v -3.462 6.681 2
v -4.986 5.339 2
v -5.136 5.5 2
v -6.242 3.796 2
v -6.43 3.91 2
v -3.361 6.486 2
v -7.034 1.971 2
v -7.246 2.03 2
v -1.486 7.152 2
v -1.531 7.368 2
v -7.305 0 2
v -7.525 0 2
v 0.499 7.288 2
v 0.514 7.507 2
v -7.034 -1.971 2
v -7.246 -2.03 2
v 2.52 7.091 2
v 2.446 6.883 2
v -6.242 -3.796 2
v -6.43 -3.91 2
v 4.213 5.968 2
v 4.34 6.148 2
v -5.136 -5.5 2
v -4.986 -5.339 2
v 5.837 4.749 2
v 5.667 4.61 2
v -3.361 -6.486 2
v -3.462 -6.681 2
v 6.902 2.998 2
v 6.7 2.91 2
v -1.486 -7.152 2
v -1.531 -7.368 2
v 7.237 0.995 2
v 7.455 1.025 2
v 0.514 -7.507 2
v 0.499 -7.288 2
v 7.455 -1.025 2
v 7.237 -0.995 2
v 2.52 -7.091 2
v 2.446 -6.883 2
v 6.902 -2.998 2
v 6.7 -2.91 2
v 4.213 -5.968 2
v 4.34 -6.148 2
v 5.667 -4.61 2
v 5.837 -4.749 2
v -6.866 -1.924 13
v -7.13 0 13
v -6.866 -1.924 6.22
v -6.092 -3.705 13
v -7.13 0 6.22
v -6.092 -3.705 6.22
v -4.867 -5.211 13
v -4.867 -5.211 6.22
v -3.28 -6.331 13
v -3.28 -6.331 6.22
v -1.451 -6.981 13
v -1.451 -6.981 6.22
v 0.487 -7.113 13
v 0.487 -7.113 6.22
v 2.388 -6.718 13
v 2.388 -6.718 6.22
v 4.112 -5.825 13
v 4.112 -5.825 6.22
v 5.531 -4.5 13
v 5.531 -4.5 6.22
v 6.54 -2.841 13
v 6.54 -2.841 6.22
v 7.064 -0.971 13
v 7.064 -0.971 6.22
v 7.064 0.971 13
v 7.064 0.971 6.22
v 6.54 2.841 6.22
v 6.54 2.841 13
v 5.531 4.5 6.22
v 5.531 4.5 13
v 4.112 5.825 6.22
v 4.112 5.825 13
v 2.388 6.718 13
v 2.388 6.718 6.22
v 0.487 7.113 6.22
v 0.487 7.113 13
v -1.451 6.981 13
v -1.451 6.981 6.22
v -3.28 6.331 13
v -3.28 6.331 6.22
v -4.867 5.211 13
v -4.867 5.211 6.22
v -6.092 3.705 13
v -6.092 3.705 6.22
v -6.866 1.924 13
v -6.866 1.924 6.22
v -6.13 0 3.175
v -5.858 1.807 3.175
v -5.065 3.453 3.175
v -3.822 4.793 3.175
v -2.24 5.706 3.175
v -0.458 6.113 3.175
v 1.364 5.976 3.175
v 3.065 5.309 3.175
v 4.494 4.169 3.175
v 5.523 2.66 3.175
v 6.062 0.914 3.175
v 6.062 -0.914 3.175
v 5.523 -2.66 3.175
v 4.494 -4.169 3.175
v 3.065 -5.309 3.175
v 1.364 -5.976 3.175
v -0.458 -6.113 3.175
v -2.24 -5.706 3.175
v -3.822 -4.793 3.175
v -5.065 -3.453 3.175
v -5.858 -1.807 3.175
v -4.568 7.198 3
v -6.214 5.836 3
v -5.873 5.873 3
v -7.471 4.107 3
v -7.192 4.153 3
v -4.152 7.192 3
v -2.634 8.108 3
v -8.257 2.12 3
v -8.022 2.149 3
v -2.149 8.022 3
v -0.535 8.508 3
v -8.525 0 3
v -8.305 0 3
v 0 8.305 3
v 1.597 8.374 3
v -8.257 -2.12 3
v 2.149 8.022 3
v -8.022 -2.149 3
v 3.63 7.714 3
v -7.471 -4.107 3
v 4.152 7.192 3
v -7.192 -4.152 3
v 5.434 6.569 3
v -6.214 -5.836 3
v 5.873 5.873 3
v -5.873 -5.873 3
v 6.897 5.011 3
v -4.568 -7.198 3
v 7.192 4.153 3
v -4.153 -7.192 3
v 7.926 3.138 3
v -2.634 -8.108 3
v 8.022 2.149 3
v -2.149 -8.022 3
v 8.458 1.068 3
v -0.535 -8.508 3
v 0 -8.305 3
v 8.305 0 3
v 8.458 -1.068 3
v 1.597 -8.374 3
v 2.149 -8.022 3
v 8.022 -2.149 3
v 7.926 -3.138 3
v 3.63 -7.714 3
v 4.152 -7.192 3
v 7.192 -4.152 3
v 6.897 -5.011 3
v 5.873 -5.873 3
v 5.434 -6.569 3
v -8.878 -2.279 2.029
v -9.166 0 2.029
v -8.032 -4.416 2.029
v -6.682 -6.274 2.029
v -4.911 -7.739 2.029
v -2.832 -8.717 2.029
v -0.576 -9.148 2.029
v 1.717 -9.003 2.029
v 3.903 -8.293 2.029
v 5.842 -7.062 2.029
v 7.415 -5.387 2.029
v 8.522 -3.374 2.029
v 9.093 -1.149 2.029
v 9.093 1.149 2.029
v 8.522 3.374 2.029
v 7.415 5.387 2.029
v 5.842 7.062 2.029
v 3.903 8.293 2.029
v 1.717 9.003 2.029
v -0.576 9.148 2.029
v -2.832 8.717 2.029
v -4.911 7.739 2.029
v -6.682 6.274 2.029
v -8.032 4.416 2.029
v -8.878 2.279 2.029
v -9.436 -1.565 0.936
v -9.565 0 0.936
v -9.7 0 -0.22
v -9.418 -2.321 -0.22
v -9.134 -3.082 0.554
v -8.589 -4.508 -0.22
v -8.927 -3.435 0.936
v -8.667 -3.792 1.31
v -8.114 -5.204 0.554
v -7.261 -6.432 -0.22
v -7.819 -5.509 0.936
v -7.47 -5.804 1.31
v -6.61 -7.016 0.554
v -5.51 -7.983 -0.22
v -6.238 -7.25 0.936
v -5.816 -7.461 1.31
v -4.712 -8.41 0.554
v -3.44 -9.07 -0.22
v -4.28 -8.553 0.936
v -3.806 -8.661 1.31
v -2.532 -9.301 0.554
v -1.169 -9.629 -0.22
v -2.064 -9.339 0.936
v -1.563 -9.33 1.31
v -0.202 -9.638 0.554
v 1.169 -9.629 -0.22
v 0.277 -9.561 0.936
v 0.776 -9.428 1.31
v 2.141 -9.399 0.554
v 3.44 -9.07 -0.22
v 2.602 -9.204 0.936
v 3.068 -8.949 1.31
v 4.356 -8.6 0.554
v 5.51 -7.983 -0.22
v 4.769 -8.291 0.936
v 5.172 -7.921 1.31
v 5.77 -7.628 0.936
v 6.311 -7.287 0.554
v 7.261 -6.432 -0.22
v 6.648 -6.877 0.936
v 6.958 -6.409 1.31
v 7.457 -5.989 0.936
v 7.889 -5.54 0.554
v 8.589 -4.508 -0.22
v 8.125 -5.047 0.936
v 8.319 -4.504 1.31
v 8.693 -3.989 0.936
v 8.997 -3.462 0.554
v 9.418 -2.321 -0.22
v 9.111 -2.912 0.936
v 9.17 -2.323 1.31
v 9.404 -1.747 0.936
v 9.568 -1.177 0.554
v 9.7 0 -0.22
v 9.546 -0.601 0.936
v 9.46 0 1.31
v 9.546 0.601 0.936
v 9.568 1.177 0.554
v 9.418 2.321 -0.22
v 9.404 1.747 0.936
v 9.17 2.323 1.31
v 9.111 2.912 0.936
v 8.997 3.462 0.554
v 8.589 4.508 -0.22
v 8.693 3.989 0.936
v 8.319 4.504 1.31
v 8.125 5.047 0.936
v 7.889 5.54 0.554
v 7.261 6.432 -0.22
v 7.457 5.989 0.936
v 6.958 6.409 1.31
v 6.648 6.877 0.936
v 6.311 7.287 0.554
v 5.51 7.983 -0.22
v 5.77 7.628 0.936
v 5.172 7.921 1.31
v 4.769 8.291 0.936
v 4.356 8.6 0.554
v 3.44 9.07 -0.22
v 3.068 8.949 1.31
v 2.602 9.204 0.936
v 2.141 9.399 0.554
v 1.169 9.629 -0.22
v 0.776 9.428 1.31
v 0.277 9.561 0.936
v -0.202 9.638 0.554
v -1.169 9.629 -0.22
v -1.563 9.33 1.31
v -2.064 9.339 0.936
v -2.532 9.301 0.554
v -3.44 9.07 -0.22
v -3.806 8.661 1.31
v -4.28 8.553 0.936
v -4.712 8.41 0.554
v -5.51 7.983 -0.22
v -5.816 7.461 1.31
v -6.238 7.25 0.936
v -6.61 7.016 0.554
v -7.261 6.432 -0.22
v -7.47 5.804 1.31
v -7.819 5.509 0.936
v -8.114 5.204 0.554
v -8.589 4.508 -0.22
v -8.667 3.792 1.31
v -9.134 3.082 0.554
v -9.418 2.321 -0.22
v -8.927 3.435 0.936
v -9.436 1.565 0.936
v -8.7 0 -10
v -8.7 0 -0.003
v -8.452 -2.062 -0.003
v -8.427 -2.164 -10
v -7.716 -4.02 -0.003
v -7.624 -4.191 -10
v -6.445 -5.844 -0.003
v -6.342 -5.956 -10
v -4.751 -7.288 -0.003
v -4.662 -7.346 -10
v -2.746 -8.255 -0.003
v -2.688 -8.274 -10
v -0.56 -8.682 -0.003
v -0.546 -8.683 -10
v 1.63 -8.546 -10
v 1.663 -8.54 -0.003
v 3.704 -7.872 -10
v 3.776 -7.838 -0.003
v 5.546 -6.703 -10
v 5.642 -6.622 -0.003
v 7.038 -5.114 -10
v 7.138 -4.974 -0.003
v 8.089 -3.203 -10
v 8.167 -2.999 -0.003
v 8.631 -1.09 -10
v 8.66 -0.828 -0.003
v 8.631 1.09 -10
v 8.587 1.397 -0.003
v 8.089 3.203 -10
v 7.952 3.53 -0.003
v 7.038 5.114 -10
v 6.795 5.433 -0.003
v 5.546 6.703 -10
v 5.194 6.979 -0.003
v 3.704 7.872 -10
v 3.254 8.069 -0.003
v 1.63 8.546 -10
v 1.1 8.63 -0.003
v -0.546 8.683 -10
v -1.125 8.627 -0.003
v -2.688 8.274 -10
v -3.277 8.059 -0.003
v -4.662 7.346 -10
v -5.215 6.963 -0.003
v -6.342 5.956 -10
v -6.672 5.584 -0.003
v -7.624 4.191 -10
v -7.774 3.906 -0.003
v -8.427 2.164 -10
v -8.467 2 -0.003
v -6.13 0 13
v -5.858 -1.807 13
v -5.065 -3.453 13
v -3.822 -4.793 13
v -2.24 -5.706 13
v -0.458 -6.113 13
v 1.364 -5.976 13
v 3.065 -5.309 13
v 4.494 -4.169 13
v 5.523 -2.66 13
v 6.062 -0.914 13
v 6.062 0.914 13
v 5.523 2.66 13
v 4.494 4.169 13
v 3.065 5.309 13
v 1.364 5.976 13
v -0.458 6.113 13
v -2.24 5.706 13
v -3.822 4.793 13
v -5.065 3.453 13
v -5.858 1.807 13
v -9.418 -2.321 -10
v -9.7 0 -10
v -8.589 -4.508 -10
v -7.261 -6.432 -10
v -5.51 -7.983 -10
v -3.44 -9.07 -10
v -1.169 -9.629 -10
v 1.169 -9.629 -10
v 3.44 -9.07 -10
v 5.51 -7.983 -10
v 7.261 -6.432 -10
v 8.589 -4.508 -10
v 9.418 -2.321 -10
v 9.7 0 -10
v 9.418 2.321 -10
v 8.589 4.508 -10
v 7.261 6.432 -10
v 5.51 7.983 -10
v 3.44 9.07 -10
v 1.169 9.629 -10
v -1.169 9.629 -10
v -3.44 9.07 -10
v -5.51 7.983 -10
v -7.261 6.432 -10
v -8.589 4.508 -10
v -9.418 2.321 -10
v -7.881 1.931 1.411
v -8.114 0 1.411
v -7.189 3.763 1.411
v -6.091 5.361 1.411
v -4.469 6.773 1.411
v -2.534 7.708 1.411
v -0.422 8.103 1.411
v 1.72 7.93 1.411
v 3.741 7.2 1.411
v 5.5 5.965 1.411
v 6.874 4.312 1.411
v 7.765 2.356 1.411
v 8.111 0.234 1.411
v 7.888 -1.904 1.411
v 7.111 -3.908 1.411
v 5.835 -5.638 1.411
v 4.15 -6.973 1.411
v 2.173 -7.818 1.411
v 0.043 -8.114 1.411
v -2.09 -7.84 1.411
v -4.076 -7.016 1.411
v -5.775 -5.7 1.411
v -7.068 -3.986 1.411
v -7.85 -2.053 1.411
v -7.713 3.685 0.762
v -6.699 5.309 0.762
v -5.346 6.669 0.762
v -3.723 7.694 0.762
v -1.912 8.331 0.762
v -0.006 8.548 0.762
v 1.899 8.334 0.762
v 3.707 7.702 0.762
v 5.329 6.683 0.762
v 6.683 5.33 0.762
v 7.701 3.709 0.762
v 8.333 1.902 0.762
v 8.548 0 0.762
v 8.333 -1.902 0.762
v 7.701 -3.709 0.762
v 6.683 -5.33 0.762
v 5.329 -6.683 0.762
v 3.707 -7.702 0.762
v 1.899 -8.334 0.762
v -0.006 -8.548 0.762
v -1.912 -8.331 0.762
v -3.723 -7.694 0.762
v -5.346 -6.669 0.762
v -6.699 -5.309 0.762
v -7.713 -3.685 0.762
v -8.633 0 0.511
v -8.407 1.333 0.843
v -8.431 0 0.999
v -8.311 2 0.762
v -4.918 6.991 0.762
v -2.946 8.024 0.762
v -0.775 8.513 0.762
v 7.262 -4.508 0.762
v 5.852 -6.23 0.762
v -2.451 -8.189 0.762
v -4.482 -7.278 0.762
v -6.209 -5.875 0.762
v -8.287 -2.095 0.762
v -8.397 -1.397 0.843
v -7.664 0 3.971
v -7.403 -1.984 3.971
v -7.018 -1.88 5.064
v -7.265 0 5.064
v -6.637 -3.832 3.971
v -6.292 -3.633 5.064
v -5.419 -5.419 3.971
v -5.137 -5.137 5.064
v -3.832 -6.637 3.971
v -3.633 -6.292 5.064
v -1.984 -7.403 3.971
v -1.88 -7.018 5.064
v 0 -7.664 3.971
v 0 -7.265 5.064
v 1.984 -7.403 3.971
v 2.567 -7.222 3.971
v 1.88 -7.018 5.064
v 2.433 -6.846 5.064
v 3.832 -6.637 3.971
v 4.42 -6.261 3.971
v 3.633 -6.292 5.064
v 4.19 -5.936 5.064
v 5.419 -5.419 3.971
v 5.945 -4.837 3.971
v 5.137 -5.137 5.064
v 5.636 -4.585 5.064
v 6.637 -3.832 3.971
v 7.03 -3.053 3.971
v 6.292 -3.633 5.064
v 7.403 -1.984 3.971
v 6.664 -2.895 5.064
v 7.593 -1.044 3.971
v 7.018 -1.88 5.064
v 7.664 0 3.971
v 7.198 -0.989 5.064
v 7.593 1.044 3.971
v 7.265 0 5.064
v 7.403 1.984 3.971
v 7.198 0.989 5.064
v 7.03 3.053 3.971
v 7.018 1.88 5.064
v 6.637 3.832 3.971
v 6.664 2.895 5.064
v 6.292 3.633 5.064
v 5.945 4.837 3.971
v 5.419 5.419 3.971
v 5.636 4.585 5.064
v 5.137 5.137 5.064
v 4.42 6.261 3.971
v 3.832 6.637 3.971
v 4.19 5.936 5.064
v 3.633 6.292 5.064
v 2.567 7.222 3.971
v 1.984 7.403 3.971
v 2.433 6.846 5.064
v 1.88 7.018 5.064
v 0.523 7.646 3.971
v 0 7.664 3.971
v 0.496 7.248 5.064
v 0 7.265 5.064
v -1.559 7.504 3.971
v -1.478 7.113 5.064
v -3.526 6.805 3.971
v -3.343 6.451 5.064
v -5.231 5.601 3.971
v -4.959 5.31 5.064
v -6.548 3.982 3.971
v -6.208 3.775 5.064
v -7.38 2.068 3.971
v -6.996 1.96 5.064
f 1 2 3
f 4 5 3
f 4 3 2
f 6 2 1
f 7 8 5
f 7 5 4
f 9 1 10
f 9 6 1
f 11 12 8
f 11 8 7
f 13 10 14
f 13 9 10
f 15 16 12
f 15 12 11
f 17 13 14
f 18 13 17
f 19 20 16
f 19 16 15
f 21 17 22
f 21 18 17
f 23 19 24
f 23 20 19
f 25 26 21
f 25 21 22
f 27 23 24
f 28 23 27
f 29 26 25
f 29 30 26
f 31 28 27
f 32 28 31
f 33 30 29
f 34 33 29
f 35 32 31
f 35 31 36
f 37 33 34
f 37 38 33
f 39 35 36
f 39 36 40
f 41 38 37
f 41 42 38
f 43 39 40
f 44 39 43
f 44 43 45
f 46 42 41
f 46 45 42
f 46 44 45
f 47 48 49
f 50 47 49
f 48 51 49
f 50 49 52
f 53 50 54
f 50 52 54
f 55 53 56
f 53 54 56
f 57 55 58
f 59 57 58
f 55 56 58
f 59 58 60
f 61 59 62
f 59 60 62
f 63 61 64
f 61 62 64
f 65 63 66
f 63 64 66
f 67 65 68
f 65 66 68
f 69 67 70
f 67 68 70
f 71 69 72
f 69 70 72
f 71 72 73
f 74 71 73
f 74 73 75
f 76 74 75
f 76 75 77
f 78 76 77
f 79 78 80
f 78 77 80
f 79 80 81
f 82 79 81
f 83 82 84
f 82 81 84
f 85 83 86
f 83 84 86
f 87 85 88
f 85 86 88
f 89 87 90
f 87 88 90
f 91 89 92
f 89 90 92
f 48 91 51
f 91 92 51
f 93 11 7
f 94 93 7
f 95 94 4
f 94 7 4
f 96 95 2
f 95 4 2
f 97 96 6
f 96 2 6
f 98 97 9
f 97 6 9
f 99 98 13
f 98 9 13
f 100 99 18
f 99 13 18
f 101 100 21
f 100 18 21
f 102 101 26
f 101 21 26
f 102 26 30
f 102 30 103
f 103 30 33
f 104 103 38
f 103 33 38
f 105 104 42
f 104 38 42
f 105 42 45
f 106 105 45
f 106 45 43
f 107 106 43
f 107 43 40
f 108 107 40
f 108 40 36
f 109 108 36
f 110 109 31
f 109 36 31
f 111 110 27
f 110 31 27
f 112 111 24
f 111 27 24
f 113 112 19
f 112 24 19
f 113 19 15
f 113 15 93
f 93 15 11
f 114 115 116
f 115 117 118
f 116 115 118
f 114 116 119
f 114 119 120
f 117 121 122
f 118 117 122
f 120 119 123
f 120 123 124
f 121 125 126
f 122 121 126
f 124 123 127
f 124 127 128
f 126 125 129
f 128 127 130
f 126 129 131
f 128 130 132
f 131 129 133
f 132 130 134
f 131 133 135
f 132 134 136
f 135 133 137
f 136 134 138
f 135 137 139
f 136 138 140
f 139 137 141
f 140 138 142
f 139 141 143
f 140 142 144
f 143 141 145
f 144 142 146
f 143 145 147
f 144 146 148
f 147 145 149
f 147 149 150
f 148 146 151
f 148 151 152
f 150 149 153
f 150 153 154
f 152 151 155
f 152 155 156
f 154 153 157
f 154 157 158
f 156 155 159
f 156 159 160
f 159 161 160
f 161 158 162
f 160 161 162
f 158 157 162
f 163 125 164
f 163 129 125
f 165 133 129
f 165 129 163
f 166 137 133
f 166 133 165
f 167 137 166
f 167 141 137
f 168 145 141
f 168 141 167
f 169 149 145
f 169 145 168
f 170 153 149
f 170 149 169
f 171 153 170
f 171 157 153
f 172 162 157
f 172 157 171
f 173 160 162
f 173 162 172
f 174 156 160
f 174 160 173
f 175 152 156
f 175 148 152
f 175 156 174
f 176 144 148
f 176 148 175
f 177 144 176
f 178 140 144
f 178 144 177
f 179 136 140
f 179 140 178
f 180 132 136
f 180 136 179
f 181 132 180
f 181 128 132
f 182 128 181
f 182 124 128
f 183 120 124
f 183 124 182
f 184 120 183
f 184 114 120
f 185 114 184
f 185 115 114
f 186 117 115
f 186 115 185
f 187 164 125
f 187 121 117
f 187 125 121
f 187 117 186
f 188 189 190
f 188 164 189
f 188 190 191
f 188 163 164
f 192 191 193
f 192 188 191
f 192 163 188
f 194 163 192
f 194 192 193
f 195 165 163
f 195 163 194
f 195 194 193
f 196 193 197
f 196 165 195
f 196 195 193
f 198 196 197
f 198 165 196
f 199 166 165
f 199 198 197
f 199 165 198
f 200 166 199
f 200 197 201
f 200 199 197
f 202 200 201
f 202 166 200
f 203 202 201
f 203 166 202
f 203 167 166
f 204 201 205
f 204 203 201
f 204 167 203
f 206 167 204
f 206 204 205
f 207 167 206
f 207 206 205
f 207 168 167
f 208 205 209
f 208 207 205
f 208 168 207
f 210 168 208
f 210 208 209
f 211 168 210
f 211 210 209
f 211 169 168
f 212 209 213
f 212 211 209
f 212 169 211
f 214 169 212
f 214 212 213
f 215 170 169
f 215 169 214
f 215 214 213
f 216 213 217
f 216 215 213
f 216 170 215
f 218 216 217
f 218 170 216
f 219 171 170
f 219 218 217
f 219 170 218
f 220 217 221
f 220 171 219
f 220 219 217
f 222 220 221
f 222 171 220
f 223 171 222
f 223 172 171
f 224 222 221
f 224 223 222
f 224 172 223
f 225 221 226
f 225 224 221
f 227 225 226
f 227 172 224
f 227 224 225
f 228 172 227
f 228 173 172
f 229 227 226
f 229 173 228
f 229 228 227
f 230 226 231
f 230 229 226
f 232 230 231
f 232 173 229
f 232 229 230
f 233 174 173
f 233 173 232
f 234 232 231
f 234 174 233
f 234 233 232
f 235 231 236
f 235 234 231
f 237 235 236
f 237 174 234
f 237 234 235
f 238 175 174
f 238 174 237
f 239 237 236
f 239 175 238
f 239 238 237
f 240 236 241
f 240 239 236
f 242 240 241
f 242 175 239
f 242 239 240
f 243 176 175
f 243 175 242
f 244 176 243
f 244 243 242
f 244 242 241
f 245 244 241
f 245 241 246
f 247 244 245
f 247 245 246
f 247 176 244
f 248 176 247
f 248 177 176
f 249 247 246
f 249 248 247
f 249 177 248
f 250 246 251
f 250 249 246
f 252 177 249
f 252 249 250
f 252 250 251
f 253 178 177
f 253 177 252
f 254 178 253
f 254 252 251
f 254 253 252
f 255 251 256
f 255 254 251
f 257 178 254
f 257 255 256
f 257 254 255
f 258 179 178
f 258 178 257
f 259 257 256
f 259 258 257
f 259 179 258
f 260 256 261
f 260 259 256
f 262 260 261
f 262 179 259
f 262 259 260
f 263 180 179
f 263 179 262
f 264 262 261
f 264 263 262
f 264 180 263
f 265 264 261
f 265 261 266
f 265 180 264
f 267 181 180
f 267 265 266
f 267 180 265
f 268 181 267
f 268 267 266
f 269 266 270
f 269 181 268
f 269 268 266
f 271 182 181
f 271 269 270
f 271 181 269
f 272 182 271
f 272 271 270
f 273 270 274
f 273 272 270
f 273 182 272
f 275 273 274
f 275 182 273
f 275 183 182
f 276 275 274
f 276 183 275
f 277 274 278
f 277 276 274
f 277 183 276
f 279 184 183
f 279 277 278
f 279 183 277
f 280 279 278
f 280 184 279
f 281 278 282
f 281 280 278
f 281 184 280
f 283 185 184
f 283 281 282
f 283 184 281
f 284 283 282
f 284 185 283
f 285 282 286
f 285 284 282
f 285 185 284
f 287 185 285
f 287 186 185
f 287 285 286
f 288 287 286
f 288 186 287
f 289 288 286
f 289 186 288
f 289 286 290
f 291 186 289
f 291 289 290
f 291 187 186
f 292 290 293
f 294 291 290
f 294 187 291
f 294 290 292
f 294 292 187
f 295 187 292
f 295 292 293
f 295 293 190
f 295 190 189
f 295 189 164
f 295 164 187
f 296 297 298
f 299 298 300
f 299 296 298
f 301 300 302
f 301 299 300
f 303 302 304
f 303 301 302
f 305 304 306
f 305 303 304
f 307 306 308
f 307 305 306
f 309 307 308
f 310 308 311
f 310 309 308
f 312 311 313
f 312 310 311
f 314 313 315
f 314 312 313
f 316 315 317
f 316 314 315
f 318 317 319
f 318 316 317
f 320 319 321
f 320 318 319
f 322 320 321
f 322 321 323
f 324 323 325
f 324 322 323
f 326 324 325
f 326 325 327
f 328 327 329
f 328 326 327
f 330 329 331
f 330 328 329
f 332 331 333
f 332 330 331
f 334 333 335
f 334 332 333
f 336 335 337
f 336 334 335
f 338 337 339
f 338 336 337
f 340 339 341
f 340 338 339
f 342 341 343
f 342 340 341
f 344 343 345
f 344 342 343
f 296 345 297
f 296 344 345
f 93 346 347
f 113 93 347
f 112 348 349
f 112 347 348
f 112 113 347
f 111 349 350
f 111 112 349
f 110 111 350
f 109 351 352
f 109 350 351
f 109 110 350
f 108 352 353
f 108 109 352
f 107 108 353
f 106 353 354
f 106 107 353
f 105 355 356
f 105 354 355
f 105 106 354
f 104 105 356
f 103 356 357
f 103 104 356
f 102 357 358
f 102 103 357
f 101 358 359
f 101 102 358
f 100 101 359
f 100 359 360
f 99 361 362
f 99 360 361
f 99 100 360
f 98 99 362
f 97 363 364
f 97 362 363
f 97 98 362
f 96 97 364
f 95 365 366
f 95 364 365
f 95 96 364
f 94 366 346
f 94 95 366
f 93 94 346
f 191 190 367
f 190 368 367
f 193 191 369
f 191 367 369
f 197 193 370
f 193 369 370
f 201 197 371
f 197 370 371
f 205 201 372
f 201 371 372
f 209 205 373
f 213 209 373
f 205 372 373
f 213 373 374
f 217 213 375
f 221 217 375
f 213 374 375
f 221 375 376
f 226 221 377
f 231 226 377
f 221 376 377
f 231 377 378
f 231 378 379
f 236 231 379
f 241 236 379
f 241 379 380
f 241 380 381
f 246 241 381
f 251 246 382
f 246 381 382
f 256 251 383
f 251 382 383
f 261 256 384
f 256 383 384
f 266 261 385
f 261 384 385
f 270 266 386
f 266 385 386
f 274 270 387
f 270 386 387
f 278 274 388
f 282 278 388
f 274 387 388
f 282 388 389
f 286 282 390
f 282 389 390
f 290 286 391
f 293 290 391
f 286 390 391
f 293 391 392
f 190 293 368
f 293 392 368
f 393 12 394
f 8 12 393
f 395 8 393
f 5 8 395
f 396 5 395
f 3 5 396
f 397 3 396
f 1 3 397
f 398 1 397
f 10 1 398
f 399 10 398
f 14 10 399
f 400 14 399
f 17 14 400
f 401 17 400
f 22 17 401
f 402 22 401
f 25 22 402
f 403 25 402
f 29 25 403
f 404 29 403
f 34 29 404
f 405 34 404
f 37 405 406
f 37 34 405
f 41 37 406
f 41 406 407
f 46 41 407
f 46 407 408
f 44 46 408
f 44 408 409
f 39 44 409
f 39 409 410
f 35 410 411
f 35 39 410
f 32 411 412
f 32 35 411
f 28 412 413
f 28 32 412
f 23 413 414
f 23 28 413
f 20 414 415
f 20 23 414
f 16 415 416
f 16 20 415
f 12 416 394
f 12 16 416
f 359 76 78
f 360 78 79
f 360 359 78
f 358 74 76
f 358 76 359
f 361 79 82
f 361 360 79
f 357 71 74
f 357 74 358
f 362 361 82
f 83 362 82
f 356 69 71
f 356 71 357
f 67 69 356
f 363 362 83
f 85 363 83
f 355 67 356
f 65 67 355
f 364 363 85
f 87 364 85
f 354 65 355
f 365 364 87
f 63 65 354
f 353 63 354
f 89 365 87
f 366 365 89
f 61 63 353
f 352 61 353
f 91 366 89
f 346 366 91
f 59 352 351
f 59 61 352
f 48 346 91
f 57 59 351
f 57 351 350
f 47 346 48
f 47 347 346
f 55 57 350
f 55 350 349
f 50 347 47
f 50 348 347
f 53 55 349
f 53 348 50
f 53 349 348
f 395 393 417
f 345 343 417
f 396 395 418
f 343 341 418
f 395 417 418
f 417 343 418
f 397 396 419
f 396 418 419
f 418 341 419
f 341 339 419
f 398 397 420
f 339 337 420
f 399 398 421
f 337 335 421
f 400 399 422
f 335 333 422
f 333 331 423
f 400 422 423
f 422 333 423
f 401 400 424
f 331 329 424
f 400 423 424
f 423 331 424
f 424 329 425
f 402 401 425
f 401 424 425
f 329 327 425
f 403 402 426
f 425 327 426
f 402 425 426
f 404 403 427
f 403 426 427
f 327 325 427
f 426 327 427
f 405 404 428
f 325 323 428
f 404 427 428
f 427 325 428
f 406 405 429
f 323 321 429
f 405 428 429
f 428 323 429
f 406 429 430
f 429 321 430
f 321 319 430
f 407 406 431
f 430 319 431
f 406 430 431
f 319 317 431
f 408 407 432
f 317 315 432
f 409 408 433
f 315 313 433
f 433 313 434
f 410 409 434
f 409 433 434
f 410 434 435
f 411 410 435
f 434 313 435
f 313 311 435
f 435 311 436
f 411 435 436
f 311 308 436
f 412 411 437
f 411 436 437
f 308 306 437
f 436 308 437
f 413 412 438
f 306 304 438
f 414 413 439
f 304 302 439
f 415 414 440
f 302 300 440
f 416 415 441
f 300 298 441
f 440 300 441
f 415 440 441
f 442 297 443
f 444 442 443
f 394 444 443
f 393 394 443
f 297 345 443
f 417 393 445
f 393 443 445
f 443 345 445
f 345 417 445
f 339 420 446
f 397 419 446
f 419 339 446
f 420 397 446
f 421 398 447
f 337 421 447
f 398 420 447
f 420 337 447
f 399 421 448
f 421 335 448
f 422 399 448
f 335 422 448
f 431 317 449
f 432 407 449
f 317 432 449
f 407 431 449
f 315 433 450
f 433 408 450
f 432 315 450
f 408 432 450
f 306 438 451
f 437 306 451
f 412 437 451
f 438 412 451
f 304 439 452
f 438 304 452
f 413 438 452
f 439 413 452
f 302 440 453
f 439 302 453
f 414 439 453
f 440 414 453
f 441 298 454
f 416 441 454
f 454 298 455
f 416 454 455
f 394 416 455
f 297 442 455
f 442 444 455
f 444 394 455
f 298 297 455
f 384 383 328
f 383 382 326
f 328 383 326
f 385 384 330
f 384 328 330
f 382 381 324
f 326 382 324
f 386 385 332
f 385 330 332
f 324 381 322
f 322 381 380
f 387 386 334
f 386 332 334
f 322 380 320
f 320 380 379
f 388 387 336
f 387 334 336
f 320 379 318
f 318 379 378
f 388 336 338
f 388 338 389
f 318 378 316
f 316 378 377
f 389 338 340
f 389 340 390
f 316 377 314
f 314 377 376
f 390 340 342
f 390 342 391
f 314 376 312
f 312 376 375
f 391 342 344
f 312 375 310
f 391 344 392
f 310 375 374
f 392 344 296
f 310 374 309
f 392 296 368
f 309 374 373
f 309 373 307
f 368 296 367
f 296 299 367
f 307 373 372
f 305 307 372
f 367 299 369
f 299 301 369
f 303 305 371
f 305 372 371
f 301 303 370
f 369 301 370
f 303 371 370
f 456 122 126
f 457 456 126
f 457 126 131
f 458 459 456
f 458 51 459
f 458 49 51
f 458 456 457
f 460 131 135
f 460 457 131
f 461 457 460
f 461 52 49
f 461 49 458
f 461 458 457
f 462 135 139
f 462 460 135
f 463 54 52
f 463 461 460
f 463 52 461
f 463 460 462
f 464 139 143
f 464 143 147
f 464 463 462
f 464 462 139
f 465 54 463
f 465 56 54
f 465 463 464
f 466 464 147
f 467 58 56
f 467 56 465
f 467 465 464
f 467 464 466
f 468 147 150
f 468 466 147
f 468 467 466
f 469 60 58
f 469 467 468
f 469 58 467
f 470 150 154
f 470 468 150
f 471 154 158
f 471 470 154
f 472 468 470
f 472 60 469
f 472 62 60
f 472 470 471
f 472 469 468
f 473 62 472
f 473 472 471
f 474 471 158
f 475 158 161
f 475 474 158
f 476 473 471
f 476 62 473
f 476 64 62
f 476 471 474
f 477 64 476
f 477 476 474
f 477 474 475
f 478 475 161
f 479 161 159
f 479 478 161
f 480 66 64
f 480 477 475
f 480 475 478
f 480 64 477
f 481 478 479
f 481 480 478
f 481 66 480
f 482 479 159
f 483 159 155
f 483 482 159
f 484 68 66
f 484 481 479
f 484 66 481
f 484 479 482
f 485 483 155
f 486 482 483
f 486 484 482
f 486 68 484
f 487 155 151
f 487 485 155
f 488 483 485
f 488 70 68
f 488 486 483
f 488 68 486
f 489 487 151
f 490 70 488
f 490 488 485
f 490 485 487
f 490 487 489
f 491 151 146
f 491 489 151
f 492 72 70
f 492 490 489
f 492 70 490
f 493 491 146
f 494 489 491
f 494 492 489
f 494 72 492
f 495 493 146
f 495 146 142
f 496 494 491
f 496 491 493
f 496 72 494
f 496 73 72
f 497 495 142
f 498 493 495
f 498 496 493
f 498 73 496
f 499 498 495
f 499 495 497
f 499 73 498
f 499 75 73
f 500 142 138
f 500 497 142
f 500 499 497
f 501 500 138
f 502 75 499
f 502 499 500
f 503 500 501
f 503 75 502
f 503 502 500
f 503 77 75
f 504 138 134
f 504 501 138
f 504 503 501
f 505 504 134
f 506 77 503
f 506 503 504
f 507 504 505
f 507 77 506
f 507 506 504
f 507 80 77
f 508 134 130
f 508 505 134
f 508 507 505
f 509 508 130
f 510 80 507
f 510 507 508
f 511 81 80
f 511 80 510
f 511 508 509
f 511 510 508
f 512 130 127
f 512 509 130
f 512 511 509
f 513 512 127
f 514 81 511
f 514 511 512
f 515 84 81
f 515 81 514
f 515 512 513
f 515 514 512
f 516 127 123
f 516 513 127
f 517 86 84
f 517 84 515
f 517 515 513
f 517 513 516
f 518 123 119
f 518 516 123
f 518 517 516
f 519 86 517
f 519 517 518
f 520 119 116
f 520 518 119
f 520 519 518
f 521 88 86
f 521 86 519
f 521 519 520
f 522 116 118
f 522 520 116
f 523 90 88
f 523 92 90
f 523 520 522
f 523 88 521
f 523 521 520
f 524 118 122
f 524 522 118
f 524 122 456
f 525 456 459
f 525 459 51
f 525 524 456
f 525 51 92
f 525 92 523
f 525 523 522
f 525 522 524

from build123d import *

# Parameters (mm, degrees)
F0_W    = 7.13
F0_H    = 10
F0_H_2  = 3
F2_T    = -1
F3_SIZE = 1.175
F4_SIZE = 1.175
F5_R    = 2


# Not quite as in the source:
# - a fillet or chamfer that OpenCascade refuses, or shapes differently, is made with other operations: its cross-section is extruded or revolved along the edge and cut away or added


with BuildPart() as f1:
    # F0 (on Front) → F1 (revolve)
    with BuildSketch(Plane.XZ):
        with Locations((-3.565, 8)):
            Rectangle(F0_W, F0_H)
        with Locations((-3.565, 1.5)):
            Rectangle(F0_W, F0_H_2)
        Polygon((0, -10), (0, 0), (-7.13, 0), (-7.13, 3), (-9.7, 3), (-9.7, -10), align=None)
    revolve(axis=Axis((0, 0, 6.5), (0, 0, 1)))

    # F2
    f2_openings = [f1.faces().sort_by_distance(p)[0] for p in [
        (0, 0, 13),
        (0, 0, -10),
    ]]
    offset(amount=F2_T, openings=f2_openings, kind=Kind.INTERSECTION)

    # F3
    f3_edges = [f1.edges().sort_by_distance(p)[0] for p in [
        (6.13, 0, 2),
        (-6.13, 0, 7.5),
        (8.7, 0, 2),
    ]]
    chamfer(f3_edges, length=F3_SIZE)

    # F4
    f4_edges = [f1.edges().sort_by_distance(p)[0] for p in [
        (9.7, 0, 3),
        (7.13, 0, 3),
    ]]
    chamfer(f4_edges, length=F4_SIZE)

    # F5
    f5_edges = [f1.edges().sort_by_distance(p)[0] for p in [
        (8.7, 0, 0.825),
    ]]
    fillet(f5_edges, radius=F5_R)

    # F6: fillet of radius 5 on 1 edges, made by hand

    # F6_s1 → F6_t2 (revolve)
    with BuildSketch(Plane.XZ):
        with BuildLine():
            ThreePointArc((-8.305, 3), (-7.432926443, 4.5062377439), (-7.13, 6.220151394))
            Line((-7.13, 6.220151394), (-7.13, 4.175))
            Line((-7.13, 4.175), (-8.305, 3))
        make_face()
    revolve(axis=Axis((0, 0, 4.175), (0, 0, 1)))

    # F7: fillet of radius 5 on 1 edges, made by hand

    # F7_s1 → F7_t2 (revolve, cut)
    with BuildSketch(Plane.XZ):
        with BuildLine():
            ThreePointArc((-9.7, -0.220151394), (-9.397073557, 1.4937622561), (-8.525, 3))
            Line((-8.525, 3), (-9.7, 1.825))
            Line((-9.7, 1.825), (-9.7, -0.220151394))
        make_face()
    revolve(axis=Axis((0, 0, 1.825), (0, 0, 1)), mode=Mode.SUBTRACT)


solid = f1.part
